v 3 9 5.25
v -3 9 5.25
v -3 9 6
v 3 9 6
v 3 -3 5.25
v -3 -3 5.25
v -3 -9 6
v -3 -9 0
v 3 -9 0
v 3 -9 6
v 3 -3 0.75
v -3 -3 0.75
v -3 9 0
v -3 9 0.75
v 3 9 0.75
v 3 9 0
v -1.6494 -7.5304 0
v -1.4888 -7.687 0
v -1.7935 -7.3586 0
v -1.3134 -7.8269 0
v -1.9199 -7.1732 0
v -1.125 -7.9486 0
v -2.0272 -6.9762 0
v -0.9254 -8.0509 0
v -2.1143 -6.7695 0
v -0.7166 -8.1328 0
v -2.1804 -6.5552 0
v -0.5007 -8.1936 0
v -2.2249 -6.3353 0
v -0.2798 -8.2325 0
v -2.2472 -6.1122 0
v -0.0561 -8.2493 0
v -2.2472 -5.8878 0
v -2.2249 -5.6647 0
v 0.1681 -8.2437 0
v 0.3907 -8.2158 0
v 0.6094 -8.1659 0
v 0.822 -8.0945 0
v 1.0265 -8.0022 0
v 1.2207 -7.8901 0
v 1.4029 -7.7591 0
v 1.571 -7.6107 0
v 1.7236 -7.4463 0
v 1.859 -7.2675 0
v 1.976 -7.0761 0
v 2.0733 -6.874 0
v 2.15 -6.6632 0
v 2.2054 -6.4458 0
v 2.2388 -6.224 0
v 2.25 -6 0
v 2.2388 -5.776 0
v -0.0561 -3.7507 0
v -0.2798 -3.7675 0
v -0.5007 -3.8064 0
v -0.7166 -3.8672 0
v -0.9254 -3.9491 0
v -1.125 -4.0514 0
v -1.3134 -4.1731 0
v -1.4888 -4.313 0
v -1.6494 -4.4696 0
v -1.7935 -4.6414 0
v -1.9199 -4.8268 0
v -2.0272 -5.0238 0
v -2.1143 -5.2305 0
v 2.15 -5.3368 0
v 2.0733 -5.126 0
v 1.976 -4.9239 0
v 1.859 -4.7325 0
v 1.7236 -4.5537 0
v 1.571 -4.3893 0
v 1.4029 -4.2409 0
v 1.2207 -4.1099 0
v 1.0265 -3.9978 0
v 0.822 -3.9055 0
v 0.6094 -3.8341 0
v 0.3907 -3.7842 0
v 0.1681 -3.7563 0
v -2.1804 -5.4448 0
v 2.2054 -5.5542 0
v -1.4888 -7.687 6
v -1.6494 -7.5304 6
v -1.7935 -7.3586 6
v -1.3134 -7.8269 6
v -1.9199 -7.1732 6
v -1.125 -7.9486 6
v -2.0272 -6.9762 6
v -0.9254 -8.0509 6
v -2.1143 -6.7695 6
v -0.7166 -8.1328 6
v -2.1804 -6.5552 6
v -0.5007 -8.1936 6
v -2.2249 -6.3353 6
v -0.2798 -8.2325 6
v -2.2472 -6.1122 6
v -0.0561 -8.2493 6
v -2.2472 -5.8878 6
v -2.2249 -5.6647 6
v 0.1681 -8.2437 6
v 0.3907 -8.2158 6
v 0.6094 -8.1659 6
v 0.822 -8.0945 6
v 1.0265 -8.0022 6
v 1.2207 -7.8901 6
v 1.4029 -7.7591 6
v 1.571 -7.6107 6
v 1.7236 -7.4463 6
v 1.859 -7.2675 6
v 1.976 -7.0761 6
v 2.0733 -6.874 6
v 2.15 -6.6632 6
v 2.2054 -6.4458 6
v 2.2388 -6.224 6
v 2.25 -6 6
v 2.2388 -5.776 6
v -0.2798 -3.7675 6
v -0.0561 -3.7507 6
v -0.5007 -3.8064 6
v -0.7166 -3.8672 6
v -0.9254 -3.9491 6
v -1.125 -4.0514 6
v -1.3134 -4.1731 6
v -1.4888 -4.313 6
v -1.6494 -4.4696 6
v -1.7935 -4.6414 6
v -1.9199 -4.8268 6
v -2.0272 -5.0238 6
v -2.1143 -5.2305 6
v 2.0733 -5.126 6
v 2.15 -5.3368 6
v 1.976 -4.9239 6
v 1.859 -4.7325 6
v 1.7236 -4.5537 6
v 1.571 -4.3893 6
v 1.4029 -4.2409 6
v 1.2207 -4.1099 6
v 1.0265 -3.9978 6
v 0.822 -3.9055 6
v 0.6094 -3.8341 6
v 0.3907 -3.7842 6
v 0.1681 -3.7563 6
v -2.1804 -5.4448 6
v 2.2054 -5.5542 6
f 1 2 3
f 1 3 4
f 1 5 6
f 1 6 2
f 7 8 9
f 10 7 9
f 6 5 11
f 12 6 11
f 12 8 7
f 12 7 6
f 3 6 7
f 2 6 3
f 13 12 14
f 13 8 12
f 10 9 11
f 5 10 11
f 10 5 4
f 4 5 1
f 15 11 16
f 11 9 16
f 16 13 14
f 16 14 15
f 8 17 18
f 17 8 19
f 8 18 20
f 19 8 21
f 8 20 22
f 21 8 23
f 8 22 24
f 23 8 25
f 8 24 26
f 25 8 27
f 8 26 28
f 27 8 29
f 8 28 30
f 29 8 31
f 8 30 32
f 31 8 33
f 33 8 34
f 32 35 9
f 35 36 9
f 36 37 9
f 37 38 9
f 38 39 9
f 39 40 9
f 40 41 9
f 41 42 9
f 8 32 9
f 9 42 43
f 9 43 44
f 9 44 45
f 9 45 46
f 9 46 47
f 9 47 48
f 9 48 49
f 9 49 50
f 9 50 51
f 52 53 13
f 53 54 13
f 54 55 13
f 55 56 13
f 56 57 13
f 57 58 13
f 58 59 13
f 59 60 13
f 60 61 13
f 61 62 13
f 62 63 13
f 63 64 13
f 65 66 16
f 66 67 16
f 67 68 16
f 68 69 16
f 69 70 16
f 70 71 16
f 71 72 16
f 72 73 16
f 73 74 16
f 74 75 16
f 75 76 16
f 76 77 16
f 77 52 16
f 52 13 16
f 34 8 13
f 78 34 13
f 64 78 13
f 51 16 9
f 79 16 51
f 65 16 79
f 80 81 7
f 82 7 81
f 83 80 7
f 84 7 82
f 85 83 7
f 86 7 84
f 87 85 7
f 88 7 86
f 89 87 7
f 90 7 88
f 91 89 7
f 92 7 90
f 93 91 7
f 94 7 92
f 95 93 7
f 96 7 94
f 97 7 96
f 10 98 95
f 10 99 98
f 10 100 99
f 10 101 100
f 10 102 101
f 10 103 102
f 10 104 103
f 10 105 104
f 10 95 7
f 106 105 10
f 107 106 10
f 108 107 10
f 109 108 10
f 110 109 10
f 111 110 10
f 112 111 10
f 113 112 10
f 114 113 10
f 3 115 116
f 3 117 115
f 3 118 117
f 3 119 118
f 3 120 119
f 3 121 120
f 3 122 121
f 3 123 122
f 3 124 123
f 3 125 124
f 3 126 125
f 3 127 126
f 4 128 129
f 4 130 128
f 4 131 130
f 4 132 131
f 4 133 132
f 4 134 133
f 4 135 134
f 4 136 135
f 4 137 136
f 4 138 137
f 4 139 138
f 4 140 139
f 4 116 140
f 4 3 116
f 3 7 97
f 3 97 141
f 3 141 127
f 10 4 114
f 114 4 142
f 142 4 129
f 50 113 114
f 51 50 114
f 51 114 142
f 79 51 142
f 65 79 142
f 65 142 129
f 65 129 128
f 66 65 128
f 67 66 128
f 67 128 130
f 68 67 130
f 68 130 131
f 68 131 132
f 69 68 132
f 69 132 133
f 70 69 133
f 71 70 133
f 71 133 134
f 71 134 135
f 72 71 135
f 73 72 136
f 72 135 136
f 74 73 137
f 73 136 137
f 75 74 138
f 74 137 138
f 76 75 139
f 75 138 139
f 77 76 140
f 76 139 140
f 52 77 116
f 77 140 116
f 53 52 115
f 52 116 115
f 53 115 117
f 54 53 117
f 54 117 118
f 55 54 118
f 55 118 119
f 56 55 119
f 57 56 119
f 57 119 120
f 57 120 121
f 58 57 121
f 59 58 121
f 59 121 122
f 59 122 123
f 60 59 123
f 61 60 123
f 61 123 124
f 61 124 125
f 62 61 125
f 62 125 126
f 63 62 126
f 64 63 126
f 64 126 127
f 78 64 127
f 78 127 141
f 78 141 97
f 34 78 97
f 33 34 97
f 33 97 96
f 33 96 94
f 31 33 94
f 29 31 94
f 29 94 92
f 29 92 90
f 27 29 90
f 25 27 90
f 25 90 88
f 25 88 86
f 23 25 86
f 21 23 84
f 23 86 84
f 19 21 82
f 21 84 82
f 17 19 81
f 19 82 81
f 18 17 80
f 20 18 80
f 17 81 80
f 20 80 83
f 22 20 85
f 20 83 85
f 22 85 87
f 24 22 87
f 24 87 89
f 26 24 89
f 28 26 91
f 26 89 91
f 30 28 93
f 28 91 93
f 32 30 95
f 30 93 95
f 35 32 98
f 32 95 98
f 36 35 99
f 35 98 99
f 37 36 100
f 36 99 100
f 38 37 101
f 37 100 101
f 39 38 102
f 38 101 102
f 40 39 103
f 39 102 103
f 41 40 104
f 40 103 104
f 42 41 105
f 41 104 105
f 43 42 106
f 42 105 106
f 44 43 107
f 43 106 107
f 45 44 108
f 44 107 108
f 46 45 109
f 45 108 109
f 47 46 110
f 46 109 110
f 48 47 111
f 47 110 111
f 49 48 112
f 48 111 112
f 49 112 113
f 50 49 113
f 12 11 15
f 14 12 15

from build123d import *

# Parameters (mm, degrees)
SKETCH2_W           = 6
SKETCH2_H           = 18
BOSS_EXTRUDE1_DEPTH = 6
SKETCH3_R           = 2.25
CUT_EXTRUDE1_DEPTH  = 12.22497216
SKETCH4_W           = 4.5
SKETCH4_H           = 12
CUT_EXTRUDE2_DEPTH  = 13.369316877


with BuildPart() as part:
    # Sketch2 → Boss-Extrude1 (new body)
    with BuildSketch(Plane.XY):
        Rectangle(SKETCH2_W, SKETCH2_H)
    extrude(amount=BOSS_EXTRUDE1_DEPTH)

    # Sketch3 → Cut-Extrude1 (cut, through all)
    with BuildSketch(Plane.XY.offset(6)):
        with Locations((0, -6)):
            Circle(SKETCH3_R)
    extrude(amount=-CUT_EXTRUDE1_DEPTH, mode=Mode.SUBTRACT)

    # Sketch4 → Cut-Extrude2 (cut, through all)
    with BuildSketch(Plane(origin=(3, 0, 0), x_dir=(0, 0, -1), z_dir=(1, 0, 0))):
        with Locations((-3, 3)):
            Rectangle(SKETCH4_W, SKETCH4_H)
    extrude(amount=-CUT_EXTRUDE2_DEPTH, mode=Mode.SUBTRACT)


solid = part.part
